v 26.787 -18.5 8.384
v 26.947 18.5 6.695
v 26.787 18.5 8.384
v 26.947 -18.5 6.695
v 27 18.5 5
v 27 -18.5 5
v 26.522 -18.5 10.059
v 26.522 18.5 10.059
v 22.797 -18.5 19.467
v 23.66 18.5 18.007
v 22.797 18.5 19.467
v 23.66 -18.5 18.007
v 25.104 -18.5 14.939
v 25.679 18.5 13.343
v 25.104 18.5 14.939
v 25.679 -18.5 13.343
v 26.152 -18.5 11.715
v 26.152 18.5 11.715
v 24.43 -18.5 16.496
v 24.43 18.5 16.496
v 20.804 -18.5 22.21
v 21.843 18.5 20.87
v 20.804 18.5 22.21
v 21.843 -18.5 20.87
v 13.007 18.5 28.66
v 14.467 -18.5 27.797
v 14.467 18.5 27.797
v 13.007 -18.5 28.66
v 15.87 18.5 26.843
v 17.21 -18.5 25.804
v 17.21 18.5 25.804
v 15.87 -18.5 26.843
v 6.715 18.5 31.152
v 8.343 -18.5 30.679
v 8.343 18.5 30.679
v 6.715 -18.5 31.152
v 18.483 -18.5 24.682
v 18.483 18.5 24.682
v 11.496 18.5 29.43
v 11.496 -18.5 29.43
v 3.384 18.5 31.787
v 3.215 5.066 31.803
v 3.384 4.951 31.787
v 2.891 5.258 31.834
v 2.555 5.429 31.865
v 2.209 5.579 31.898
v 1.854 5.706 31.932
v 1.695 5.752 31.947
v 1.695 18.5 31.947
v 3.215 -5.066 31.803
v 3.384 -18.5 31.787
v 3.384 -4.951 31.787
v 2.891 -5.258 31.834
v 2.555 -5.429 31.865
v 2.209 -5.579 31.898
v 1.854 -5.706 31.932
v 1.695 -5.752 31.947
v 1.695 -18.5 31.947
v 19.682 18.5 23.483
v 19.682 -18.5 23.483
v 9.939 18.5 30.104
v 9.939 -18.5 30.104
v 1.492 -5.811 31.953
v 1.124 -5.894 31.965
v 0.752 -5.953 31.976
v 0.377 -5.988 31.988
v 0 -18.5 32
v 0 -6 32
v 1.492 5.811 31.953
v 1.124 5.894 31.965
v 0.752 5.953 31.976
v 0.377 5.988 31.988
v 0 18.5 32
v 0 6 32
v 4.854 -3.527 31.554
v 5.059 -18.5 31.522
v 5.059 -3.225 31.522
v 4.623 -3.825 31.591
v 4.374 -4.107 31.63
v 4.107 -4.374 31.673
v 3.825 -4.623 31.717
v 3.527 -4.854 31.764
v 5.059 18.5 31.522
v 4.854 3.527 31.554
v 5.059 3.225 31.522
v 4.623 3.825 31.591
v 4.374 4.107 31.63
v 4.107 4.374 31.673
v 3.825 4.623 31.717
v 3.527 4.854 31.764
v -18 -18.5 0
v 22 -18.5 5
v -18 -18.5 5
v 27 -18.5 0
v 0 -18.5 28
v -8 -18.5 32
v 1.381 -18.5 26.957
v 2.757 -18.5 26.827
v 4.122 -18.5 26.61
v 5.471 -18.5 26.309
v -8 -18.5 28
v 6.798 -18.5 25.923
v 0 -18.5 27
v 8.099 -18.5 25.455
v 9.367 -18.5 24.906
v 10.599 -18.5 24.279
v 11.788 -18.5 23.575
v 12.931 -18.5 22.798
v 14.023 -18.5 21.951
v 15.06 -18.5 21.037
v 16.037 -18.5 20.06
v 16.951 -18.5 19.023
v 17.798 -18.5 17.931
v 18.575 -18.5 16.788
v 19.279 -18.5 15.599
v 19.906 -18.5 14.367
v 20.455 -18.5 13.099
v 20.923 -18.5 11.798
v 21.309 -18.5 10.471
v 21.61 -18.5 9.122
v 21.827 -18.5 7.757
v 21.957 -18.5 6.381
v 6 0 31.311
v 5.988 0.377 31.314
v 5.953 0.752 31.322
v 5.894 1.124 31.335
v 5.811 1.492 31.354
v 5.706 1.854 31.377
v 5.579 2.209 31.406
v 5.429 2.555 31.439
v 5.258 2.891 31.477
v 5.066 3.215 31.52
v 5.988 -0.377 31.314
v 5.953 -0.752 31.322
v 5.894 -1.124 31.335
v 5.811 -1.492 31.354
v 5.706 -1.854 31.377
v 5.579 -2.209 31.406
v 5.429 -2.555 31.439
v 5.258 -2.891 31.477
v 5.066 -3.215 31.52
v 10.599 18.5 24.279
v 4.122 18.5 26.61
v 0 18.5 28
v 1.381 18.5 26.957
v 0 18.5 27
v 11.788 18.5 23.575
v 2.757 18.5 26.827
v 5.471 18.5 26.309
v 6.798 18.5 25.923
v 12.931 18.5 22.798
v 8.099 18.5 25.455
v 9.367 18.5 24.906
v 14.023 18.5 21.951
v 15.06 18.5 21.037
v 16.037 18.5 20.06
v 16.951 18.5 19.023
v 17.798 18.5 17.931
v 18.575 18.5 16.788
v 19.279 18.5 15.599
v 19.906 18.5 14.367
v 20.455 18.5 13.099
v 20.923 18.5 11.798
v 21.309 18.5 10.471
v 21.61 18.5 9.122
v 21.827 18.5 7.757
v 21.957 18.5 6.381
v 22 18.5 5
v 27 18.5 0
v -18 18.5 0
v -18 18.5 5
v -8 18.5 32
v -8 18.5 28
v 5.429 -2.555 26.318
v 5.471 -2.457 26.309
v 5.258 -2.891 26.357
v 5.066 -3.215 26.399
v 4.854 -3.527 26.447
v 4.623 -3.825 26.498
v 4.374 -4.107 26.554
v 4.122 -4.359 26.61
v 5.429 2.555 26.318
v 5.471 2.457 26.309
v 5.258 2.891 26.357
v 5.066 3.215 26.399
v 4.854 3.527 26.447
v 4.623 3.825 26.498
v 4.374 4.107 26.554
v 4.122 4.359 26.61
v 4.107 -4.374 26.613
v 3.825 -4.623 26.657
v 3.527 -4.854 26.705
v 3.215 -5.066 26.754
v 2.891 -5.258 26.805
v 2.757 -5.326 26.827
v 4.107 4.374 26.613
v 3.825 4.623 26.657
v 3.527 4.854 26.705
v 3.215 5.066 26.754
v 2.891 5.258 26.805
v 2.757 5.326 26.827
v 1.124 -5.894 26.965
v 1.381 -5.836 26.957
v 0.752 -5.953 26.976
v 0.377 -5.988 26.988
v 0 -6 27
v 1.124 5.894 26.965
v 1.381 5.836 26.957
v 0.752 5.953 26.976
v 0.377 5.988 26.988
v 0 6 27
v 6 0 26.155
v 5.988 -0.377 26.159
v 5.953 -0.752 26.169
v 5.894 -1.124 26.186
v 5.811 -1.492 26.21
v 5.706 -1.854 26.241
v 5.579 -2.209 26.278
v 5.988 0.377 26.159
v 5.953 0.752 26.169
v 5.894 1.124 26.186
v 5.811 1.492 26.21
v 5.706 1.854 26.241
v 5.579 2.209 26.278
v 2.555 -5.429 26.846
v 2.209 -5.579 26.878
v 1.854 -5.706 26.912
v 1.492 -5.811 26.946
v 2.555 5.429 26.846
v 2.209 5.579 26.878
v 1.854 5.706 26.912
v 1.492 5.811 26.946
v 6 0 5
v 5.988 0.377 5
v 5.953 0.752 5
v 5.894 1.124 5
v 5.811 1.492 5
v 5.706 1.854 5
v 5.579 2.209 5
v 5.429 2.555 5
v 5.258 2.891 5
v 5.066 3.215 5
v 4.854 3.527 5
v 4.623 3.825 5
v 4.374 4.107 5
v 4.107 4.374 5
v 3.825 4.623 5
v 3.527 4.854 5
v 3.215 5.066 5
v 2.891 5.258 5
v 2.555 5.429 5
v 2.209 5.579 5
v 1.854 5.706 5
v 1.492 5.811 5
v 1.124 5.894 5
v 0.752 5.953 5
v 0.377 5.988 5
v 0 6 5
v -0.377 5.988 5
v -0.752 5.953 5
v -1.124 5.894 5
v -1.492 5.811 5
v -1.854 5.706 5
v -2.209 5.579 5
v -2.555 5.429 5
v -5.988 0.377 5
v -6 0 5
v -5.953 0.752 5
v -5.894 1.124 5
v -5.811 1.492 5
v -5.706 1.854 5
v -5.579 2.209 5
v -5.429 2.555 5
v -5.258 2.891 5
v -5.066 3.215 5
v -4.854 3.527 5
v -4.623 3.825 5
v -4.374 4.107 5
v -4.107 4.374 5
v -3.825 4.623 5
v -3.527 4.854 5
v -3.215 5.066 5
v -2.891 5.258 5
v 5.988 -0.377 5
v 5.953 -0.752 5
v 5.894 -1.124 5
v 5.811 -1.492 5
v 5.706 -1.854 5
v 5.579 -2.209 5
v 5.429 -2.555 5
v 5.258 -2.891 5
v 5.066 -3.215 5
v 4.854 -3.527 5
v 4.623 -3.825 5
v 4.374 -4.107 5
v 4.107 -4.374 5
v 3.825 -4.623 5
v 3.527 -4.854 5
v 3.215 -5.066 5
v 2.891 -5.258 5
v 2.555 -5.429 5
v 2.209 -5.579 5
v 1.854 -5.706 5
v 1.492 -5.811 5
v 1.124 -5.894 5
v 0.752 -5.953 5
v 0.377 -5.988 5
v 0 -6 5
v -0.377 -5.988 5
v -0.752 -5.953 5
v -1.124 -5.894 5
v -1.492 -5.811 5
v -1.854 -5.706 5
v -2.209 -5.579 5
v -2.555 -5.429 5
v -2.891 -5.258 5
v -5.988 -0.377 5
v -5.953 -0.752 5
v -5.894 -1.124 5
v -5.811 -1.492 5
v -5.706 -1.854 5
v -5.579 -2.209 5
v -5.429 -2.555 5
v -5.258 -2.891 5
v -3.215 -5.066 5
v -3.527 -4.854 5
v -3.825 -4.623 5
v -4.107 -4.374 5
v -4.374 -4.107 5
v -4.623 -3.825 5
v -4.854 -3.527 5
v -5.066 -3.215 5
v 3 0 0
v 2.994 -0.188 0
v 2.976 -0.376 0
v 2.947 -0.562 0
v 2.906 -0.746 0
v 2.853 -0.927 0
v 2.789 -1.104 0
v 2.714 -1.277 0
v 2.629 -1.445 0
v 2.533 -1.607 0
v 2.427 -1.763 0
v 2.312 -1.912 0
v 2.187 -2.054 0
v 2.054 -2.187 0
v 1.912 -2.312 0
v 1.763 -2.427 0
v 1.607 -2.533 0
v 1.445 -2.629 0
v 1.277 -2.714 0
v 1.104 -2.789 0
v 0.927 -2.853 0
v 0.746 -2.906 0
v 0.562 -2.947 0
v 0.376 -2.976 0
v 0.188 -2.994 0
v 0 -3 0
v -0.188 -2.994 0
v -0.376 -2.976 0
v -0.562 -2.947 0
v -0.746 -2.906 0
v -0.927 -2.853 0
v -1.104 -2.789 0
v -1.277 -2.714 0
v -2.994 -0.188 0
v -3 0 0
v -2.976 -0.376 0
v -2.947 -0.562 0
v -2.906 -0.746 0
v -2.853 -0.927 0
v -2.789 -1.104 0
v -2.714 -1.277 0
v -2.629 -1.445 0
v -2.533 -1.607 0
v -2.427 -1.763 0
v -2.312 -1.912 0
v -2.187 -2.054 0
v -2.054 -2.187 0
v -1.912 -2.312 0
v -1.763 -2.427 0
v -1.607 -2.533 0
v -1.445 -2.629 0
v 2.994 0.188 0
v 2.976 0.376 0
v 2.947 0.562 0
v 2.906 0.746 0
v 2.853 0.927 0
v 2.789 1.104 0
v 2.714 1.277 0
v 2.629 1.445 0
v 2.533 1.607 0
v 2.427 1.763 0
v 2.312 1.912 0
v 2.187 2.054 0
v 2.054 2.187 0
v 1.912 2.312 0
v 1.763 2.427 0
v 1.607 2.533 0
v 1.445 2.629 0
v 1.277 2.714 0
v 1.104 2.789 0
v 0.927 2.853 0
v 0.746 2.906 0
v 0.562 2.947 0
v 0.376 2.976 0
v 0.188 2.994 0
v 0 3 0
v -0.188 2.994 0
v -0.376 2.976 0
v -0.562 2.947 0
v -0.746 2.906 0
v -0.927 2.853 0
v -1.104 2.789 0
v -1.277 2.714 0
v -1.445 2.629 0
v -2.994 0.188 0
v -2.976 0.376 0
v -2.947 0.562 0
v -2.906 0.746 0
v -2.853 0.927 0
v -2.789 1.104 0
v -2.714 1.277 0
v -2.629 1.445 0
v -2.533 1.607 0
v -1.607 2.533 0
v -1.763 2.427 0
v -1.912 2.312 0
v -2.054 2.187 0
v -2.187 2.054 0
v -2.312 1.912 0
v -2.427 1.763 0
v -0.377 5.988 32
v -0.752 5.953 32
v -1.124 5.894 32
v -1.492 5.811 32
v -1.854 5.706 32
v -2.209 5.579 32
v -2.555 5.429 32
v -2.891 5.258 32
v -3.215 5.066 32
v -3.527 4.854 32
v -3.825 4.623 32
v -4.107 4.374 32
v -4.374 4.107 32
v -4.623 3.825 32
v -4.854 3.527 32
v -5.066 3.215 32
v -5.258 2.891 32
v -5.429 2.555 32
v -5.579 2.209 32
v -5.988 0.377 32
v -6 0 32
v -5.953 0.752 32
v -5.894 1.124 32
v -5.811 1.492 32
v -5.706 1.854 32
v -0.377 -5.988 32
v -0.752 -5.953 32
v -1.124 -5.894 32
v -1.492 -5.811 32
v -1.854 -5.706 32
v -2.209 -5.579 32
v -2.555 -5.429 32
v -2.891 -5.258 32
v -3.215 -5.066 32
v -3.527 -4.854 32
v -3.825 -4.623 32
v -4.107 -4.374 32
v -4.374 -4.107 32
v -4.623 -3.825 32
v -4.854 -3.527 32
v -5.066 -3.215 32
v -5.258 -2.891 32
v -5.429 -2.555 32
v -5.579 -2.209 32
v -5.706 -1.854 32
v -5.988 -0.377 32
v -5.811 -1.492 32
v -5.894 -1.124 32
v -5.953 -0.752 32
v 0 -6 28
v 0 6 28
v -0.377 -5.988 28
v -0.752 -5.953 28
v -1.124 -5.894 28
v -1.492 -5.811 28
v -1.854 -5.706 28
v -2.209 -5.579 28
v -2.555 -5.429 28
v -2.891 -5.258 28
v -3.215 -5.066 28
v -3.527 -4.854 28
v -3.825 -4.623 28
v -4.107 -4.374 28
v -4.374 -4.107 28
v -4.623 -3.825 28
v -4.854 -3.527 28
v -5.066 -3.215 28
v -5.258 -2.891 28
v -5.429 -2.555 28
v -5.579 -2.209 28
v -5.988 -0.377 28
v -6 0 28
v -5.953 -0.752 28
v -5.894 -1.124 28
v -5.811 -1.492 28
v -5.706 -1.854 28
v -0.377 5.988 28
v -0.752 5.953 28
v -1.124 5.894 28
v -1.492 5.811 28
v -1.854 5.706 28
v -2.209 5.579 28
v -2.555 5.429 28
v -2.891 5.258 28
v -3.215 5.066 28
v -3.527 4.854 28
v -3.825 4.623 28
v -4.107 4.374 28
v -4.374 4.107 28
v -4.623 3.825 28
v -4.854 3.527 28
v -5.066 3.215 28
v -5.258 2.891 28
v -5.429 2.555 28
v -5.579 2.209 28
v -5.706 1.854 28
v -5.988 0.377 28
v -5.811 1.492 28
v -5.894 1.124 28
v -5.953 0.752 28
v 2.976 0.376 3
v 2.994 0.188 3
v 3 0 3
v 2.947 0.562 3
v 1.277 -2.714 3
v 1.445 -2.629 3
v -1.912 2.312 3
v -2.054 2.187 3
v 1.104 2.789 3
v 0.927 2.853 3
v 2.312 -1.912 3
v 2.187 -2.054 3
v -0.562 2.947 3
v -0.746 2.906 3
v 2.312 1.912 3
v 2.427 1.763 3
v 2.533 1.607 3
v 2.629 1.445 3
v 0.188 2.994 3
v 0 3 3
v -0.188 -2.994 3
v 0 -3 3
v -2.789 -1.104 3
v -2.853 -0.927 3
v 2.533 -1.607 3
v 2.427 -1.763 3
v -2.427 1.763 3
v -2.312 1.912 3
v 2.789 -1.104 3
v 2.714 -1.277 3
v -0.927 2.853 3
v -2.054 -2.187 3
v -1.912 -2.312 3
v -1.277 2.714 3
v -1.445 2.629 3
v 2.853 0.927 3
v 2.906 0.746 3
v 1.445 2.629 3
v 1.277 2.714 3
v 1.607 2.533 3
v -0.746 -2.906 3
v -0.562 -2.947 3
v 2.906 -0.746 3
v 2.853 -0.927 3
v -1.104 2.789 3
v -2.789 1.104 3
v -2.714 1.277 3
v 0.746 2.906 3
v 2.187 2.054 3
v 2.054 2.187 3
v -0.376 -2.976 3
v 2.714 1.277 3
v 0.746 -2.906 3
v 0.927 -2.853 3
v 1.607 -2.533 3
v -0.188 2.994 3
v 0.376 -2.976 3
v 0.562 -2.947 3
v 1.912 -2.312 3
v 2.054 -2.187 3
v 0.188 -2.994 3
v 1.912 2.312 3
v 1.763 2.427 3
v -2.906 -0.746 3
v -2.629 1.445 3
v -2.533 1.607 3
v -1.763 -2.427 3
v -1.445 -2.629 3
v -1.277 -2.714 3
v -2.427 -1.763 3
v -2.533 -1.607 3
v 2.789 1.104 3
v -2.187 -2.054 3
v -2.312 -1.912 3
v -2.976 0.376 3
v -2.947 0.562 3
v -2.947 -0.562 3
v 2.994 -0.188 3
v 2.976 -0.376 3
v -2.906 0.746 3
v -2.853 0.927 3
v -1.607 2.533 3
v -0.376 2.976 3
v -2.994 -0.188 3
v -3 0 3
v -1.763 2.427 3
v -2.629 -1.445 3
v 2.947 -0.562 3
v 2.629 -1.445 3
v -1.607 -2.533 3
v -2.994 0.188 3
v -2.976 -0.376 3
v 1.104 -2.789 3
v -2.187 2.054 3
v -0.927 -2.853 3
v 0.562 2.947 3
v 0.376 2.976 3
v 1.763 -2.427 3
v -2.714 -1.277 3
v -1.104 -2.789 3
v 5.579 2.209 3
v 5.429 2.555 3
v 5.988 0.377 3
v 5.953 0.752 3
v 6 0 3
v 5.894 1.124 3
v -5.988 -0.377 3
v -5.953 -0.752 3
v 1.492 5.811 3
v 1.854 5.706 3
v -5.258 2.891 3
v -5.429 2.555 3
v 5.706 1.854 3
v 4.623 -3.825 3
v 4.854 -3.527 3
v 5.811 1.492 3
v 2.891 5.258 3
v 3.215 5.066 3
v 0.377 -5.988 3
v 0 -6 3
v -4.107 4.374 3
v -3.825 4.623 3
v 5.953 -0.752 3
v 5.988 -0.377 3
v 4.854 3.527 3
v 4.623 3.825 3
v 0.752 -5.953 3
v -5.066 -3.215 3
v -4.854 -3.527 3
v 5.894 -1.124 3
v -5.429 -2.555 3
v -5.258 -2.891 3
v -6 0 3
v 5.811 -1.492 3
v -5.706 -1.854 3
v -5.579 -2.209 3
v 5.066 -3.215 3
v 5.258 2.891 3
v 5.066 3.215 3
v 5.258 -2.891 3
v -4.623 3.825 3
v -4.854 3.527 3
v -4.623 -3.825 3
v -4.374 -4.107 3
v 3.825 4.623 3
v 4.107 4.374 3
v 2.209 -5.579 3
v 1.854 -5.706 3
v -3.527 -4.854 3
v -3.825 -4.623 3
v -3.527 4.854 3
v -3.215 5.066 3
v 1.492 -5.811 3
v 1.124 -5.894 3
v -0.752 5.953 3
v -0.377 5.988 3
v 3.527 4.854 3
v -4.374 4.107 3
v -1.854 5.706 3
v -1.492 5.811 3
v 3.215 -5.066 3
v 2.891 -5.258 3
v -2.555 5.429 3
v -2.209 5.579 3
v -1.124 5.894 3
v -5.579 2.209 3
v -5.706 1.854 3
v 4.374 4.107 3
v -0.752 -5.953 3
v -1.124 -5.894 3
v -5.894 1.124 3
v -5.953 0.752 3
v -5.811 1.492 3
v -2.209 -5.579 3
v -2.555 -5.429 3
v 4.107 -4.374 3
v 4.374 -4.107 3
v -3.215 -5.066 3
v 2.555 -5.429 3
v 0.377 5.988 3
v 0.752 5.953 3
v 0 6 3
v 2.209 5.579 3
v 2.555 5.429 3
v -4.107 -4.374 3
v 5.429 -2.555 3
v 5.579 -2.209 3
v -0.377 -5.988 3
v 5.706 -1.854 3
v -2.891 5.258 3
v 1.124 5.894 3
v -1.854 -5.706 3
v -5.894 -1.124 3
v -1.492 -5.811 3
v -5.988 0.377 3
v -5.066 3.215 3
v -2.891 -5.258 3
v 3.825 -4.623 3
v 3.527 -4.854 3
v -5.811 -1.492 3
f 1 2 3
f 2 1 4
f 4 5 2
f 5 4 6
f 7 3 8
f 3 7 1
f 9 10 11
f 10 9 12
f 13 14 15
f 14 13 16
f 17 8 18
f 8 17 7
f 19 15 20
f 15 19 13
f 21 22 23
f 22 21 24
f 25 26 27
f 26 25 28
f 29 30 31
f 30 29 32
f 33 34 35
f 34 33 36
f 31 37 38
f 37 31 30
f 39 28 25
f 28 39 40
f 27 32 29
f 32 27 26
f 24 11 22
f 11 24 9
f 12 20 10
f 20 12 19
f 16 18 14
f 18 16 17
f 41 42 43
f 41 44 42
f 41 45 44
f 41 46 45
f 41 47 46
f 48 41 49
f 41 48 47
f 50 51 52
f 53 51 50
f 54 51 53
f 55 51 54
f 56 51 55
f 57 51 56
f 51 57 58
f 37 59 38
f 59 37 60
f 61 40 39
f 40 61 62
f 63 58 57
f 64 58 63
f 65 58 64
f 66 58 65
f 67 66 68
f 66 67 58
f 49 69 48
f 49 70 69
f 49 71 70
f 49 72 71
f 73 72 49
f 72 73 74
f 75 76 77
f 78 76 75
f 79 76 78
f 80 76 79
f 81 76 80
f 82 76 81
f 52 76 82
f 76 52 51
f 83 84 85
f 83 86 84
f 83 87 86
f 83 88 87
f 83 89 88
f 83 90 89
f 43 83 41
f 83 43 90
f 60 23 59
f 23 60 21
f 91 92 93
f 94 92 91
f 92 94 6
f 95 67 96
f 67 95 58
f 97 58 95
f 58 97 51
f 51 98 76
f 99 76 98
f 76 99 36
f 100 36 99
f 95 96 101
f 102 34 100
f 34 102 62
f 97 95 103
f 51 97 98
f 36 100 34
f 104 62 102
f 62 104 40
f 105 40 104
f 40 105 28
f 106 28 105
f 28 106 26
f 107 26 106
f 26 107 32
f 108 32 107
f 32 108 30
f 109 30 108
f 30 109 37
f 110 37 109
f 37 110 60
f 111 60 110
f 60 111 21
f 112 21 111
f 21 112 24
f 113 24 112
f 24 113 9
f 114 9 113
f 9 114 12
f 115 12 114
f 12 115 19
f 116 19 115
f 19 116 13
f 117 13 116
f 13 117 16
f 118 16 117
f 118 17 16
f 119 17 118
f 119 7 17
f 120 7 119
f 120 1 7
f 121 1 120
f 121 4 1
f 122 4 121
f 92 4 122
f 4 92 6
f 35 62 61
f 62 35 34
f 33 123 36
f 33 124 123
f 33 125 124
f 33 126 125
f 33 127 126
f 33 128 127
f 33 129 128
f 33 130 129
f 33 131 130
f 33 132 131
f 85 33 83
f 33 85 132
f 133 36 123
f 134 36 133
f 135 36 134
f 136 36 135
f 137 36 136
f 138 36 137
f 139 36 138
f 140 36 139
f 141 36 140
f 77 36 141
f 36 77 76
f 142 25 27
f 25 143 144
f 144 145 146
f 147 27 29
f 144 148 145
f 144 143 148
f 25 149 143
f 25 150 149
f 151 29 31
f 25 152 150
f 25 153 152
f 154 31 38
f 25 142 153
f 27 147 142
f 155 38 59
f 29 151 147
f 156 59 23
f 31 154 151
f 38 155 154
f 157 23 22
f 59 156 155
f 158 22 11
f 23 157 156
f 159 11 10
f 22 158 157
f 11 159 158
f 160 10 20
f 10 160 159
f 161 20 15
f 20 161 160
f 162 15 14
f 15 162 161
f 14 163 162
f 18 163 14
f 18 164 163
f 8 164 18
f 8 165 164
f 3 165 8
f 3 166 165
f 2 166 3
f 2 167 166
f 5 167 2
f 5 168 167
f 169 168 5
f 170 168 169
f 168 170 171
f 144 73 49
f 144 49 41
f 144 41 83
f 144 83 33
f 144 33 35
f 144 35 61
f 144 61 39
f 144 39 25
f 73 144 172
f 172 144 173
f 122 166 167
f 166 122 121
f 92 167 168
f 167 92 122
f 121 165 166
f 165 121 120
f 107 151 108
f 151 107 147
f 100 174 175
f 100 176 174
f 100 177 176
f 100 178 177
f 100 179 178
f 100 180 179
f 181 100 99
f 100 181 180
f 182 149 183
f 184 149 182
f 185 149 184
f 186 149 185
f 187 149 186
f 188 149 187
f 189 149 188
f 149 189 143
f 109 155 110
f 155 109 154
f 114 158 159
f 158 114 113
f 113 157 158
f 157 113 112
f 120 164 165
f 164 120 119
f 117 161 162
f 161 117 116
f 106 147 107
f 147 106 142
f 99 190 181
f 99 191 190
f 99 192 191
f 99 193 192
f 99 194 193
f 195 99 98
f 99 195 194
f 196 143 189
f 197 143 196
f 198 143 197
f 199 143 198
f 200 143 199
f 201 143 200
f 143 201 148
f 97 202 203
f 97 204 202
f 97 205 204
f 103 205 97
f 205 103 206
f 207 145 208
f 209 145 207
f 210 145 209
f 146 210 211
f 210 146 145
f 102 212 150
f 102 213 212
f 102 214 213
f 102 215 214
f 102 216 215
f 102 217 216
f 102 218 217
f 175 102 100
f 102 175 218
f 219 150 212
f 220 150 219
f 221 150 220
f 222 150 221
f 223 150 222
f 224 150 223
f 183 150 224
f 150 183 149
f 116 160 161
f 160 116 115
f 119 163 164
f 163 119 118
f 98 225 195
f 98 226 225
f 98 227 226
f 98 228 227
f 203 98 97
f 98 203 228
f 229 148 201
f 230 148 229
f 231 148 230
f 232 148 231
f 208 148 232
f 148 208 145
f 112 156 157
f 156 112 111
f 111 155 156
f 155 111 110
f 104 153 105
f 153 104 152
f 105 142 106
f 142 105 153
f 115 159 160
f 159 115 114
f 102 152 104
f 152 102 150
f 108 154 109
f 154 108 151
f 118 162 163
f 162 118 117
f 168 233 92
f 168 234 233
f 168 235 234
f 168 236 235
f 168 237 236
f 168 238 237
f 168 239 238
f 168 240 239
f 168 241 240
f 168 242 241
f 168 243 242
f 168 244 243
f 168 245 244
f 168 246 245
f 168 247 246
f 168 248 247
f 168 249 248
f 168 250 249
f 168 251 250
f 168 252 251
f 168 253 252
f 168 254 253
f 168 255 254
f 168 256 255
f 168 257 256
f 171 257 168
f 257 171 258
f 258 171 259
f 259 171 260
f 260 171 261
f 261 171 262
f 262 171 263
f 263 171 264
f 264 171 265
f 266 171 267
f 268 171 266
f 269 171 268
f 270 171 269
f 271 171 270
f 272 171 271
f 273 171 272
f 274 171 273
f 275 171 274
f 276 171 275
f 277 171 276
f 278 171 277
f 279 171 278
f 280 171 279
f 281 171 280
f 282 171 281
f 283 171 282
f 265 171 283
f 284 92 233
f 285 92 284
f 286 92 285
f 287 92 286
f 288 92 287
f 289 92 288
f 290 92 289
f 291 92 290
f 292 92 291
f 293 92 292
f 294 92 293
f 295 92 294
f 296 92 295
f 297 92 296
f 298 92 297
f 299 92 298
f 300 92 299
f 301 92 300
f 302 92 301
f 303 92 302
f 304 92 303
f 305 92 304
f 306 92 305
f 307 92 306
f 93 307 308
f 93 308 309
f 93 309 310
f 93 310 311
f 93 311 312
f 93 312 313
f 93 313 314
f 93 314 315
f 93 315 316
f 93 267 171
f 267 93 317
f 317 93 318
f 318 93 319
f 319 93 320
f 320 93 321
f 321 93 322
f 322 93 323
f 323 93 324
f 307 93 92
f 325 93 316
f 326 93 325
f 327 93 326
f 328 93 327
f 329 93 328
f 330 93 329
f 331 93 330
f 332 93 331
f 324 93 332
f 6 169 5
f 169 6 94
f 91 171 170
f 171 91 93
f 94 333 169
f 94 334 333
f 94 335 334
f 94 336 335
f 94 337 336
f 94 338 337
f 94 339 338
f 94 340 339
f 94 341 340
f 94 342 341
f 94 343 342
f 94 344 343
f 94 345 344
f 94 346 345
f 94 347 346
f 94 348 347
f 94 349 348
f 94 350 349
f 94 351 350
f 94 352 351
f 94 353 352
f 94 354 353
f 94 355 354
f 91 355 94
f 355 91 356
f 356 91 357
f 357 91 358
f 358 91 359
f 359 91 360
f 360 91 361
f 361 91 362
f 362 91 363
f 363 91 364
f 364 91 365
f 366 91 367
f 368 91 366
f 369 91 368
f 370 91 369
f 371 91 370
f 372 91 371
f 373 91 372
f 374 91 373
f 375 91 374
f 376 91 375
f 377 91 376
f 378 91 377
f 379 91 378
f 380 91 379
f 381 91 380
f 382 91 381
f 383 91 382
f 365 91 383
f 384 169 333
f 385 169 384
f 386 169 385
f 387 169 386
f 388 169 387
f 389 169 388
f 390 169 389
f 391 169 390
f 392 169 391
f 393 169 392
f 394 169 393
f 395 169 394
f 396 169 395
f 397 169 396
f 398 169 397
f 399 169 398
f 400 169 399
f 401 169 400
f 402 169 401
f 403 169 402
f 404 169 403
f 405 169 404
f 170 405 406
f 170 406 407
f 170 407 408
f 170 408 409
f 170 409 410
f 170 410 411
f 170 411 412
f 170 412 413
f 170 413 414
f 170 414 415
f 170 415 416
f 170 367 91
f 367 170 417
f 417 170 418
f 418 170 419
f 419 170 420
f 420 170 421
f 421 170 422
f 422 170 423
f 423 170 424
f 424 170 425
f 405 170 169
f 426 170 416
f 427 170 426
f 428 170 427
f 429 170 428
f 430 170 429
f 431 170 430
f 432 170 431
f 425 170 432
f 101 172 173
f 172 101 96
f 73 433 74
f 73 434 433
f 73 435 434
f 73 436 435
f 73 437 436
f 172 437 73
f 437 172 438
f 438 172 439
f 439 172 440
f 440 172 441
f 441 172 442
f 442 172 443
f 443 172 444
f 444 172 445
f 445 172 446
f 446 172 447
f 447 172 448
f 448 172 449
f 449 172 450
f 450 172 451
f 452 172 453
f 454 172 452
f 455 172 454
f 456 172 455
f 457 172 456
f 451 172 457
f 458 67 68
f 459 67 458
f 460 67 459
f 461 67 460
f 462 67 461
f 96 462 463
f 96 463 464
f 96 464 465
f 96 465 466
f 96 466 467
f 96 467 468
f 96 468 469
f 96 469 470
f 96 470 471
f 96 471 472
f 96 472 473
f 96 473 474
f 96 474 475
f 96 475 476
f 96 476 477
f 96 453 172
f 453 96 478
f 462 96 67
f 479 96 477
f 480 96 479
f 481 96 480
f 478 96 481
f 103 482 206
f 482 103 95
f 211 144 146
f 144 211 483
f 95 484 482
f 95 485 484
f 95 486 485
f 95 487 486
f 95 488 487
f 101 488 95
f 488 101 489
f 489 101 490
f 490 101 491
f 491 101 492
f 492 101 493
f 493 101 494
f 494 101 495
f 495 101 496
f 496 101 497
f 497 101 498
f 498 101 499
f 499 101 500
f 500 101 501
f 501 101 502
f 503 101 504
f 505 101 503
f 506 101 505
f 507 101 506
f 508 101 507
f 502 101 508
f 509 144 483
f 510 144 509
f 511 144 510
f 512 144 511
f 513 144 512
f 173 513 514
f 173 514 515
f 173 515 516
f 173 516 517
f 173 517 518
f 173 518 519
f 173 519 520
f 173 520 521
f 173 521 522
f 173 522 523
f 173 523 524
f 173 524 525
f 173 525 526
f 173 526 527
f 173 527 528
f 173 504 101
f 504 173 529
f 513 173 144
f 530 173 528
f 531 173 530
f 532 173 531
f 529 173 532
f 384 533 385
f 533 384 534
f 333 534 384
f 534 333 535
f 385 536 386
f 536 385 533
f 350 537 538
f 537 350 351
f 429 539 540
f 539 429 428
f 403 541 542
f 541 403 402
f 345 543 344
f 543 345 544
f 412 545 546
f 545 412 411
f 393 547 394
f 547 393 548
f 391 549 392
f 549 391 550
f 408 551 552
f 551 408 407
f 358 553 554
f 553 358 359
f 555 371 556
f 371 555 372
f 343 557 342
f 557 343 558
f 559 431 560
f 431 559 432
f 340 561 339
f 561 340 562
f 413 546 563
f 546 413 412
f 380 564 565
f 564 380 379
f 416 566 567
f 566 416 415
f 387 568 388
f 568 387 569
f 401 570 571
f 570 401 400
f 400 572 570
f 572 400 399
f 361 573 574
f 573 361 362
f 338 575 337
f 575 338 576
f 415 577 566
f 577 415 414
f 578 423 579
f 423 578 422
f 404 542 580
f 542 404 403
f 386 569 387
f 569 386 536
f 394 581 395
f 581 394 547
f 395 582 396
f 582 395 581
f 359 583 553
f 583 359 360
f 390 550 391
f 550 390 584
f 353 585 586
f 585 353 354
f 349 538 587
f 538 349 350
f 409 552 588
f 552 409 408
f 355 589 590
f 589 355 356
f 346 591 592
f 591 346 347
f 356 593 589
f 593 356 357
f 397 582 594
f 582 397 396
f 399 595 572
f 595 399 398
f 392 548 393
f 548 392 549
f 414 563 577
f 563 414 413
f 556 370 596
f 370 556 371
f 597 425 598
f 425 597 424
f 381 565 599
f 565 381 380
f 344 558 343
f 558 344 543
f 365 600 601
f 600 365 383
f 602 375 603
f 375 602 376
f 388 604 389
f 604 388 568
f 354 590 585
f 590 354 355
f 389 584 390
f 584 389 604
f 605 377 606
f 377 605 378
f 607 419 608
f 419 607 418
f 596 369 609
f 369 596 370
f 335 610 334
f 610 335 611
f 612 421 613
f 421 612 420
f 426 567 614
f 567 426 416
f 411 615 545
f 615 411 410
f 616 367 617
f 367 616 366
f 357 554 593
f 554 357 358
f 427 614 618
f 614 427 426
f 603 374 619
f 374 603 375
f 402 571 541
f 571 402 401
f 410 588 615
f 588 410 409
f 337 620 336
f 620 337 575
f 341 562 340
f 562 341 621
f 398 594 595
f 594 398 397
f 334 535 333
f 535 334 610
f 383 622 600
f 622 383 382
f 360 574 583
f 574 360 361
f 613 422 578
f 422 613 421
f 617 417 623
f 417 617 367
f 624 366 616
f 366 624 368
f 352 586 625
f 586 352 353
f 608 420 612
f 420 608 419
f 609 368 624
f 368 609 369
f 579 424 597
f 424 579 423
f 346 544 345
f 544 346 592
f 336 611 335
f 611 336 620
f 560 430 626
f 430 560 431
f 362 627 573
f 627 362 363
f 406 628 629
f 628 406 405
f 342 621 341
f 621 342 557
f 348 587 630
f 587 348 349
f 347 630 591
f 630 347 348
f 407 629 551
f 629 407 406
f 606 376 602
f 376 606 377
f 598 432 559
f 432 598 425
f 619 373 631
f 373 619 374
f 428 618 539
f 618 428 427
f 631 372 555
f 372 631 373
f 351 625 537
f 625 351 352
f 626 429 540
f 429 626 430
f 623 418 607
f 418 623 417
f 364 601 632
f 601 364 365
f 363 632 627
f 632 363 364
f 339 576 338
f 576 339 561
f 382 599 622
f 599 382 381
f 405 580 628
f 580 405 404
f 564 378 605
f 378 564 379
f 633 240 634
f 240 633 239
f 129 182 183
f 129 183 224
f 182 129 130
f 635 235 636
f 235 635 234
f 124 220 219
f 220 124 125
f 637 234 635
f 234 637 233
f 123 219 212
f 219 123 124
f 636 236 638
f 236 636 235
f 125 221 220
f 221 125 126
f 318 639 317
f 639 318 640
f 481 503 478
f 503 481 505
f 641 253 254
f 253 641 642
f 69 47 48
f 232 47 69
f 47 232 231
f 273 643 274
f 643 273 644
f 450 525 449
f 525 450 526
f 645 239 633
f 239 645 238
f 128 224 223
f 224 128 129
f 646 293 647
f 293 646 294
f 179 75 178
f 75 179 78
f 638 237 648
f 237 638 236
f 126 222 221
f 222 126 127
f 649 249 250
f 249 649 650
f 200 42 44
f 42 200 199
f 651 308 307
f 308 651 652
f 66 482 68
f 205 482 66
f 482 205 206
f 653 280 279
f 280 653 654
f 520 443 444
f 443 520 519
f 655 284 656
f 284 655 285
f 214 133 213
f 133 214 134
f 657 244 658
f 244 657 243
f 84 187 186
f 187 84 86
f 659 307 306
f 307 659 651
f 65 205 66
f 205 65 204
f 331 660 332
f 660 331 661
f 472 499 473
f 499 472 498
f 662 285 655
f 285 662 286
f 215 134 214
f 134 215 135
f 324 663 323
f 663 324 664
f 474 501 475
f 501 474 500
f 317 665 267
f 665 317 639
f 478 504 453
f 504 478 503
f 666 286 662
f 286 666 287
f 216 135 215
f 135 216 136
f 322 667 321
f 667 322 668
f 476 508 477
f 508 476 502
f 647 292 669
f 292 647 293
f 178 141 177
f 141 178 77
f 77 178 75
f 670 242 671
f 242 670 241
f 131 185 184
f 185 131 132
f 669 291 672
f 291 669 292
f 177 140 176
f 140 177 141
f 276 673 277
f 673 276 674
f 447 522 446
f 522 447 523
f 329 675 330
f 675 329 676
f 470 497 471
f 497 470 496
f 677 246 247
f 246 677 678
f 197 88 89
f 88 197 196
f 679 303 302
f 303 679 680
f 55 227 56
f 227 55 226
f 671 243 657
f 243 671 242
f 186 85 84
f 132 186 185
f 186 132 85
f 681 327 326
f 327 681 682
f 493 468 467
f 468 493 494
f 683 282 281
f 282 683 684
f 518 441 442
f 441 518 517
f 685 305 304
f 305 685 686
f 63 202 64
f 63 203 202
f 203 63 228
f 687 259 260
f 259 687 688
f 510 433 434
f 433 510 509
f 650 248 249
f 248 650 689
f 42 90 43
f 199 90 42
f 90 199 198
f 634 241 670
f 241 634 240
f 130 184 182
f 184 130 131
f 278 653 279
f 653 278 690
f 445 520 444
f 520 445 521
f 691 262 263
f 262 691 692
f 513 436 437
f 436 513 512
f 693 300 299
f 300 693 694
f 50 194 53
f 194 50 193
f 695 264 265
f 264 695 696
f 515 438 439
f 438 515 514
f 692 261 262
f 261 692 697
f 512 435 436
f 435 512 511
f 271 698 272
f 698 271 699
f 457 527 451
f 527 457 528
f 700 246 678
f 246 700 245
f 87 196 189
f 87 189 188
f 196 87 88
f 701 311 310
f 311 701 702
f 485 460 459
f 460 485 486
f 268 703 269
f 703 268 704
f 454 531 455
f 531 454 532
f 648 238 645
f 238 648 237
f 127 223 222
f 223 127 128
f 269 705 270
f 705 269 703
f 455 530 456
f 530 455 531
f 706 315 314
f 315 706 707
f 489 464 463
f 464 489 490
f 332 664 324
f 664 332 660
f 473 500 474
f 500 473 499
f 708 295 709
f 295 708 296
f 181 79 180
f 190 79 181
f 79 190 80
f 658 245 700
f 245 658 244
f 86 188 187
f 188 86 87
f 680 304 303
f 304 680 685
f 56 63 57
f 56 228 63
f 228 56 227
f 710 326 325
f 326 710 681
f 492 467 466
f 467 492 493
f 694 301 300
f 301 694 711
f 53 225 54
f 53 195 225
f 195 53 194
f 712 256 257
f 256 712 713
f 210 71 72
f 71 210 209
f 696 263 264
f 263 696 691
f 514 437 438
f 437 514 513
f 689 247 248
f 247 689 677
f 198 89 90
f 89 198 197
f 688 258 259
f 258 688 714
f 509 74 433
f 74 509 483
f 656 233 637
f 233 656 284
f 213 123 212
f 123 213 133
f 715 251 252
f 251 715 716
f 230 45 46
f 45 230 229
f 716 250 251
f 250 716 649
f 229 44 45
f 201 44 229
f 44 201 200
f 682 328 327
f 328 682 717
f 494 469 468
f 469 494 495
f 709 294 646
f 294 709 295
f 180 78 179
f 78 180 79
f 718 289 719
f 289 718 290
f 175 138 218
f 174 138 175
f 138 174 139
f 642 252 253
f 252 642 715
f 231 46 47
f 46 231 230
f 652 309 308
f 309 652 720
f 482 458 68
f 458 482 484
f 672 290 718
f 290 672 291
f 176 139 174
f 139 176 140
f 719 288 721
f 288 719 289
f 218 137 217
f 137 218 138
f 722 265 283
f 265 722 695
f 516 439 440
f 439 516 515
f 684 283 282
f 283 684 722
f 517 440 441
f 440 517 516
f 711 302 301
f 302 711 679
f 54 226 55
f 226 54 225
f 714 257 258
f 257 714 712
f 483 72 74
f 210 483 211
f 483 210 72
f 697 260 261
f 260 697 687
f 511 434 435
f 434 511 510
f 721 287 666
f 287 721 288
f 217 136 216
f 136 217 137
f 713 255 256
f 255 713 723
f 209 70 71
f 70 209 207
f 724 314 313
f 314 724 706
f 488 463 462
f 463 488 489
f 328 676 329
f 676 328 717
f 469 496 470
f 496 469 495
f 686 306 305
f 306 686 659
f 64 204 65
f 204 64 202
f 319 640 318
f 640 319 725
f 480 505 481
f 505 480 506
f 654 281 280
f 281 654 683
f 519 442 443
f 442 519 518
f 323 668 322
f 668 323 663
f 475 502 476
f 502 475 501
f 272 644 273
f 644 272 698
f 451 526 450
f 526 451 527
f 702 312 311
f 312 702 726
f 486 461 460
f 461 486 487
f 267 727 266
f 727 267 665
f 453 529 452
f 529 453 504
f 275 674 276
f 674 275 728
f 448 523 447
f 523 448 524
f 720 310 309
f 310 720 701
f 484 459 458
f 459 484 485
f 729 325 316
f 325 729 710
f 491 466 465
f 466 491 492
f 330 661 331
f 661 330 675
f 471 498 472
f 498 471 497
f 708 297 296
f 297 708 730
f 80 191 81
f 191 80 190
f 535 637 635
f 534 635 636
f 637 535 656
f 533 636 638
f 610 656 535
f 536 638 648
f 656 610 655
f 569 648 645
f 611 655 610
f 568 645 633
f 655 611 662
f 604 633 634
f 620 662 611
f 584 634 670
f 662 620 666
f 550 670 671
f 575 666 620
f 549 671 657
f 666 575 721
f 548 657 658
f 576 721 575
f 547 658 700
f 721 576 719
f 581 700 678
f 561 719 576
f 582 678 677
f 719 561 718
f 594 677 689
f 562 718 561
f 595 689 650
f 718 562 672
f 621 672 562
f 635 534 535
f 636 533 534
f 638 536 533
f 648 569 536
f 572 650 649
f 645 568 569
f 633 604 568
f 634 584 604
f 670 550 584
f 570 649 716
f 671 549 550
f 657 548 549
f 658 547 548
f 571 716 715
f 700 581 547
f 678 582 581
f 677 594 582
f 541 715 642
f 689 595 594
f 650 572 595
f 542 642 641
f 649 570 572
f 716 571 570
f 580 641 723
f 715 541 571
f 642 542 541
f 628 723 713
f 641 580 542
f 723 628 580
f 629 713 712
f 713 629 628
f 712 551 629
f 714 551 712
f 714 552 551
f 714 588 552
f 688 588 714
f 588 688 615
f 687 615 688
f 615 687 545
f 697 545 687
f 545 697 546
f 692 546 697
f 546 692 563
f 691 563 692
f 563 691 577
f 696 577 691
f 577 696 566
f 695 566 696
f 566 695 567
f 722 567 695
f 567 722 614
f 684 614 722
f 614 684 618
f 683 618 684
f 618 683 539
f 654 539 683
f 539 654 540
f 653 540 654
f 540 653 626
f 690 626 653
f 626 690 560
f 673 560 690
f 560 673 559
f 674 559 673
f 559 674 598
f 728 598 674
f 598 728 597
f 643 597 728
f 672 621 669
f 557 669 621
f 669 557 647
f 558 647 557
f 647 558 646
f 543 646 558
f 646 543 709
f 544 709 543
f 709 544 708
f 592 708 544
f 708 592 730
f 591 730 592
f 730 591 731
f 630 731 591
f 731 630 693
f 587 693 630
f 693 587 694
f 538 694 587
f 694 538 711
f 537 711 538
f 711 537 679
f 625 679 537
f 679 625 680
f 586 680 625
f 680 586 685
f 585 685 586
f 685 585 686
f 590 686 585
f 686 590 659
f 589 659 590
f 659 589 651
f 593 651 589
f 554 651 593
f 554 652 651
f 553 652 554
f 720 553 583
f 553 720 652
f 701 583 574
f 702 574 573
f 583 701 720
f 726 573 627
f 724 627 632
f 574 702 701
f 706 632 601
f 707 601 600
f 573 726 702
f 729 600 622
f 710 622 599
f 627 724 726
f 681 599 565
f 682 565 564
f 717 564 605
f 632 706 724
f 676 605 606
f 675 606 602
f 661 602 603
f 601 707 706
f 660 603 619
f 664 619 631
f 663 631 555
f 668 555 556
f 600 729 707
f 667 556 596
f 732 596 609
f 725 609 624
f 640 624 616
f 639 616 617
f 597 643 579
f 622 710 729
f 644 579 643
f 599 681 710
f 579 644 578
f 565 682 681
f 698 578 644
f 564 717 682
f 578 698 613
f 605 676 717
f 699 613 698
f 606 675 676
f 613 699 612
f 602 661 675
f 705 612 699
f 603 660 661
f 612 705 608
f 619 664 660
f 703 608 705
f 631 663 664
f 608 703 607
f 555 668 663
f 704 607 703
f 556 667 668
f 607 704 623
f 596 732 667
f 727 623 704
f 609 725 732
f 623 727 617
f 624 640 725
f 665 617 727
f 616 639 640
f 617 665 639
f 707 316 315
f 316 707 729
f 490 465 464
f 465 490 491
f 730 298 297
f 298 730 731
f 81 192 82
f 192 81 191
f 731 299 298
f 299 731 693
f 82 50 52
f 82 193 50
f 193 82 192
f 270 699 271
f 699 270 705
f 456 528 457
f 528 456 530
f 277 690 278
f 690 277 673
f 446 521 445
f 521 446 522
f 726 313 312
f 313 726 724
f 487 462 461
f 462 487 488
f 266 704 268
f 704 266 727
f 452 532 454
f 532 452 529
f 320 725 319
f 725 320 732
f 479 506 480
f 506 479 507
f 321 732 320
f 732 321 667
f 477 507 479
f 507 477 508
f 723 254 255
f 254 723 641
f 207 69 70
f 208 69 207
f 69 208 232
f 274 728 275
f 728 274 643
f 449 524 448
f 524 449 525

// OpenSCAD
$fn = 100;

Depth = 37;
TopWidth = 8;
BottomWidth = 45;
Thickness = 5;
Height = 22;

Radius = Height + Thickness;

// Felt pad to reduce friction.
UseFeltPad = true;
FPWidth = 8;
FPHeight = 1;

// Screw settings. You can also try to use other methods to mount hooks. However screws are recommended as they can handle more weright, than, for example doule-sided tape.
UseScrew = true;
SThreadsHeight = 16;
SThreadRadius = 3;
SHeadHeight = 2;
SHeadRadius = 6;

// Add smoothStep to your model.
UseSmooth = false;
SmoothRadius = 2;

module InitialModel()
{
    difference()
    {
        union()
        {
            // Rounded side creation.
            intersection()
            {
                translate([0, 0, -Thickness]){ cube(Depth + 2 * Thickness); }

                difference()
                {
                    cylinder(h = Depth, r = Radius);
                    translate([0,0,-Thickness])
                    {
                        cylinder(h = (Depth + 2 * Thickness), r = (Radius - Thickness));
                    }
                }
            }

            // Bottom Part
            translate([(Radius - BottomWidth), -Thickness, 0])
            { 
                cube([BottomWidth, Thickness, Depth]); 
            }
            
            // Top Part  
            translate([-TopWidth, (Radius - Thickness), 0])
            { 
                cube([TopWidth, Thickness, Depth]); 
            }   
        }
                 
        if(UseFeltPad)
        {
            translate([-TopWidth - 1, Radius - Thickness - 1, -1]){
                cube([FPWidth + 1, FPHeight + 1, Depth + 2]);
            }
        }
    }
}

module SmoothStep() 
{   
    difference()
    {      
        translate([SmoothRadius - TopWidth , Radius - SmoothRadius, 0])
        {
            difference()
            {
                cylinder(h = Depth, r = SmoothRadius*2);
                
                translate([0, 0, -Thickness])
                {
                    cylinder(h = Depth*2, r = SmoothRadius);
                }
            }     
        }
        
        //InitialModel();
    }
}

module ScrewHoles()
{
    translate([0, 0, -1])
    {
        cylinder(h = ((2 * Height) - (2 * Thickness)), r = SThreadRadius);
    }
         
    translate([0, 0, Thickness - SHeadHeight])
    {
        cylinder(h = ((2 * Height) - (2 * Thickness)), r = SHeadRadius);
    } 
}

difference()
{
        
    translate([0, Depth/2, Thickness])
    {   
        rotate([90,0,0])
        {
            InitialModel();
            //SmoothStep();
        }
    }
    
    if(UseScrew) { ScrewHoles(); }

}
